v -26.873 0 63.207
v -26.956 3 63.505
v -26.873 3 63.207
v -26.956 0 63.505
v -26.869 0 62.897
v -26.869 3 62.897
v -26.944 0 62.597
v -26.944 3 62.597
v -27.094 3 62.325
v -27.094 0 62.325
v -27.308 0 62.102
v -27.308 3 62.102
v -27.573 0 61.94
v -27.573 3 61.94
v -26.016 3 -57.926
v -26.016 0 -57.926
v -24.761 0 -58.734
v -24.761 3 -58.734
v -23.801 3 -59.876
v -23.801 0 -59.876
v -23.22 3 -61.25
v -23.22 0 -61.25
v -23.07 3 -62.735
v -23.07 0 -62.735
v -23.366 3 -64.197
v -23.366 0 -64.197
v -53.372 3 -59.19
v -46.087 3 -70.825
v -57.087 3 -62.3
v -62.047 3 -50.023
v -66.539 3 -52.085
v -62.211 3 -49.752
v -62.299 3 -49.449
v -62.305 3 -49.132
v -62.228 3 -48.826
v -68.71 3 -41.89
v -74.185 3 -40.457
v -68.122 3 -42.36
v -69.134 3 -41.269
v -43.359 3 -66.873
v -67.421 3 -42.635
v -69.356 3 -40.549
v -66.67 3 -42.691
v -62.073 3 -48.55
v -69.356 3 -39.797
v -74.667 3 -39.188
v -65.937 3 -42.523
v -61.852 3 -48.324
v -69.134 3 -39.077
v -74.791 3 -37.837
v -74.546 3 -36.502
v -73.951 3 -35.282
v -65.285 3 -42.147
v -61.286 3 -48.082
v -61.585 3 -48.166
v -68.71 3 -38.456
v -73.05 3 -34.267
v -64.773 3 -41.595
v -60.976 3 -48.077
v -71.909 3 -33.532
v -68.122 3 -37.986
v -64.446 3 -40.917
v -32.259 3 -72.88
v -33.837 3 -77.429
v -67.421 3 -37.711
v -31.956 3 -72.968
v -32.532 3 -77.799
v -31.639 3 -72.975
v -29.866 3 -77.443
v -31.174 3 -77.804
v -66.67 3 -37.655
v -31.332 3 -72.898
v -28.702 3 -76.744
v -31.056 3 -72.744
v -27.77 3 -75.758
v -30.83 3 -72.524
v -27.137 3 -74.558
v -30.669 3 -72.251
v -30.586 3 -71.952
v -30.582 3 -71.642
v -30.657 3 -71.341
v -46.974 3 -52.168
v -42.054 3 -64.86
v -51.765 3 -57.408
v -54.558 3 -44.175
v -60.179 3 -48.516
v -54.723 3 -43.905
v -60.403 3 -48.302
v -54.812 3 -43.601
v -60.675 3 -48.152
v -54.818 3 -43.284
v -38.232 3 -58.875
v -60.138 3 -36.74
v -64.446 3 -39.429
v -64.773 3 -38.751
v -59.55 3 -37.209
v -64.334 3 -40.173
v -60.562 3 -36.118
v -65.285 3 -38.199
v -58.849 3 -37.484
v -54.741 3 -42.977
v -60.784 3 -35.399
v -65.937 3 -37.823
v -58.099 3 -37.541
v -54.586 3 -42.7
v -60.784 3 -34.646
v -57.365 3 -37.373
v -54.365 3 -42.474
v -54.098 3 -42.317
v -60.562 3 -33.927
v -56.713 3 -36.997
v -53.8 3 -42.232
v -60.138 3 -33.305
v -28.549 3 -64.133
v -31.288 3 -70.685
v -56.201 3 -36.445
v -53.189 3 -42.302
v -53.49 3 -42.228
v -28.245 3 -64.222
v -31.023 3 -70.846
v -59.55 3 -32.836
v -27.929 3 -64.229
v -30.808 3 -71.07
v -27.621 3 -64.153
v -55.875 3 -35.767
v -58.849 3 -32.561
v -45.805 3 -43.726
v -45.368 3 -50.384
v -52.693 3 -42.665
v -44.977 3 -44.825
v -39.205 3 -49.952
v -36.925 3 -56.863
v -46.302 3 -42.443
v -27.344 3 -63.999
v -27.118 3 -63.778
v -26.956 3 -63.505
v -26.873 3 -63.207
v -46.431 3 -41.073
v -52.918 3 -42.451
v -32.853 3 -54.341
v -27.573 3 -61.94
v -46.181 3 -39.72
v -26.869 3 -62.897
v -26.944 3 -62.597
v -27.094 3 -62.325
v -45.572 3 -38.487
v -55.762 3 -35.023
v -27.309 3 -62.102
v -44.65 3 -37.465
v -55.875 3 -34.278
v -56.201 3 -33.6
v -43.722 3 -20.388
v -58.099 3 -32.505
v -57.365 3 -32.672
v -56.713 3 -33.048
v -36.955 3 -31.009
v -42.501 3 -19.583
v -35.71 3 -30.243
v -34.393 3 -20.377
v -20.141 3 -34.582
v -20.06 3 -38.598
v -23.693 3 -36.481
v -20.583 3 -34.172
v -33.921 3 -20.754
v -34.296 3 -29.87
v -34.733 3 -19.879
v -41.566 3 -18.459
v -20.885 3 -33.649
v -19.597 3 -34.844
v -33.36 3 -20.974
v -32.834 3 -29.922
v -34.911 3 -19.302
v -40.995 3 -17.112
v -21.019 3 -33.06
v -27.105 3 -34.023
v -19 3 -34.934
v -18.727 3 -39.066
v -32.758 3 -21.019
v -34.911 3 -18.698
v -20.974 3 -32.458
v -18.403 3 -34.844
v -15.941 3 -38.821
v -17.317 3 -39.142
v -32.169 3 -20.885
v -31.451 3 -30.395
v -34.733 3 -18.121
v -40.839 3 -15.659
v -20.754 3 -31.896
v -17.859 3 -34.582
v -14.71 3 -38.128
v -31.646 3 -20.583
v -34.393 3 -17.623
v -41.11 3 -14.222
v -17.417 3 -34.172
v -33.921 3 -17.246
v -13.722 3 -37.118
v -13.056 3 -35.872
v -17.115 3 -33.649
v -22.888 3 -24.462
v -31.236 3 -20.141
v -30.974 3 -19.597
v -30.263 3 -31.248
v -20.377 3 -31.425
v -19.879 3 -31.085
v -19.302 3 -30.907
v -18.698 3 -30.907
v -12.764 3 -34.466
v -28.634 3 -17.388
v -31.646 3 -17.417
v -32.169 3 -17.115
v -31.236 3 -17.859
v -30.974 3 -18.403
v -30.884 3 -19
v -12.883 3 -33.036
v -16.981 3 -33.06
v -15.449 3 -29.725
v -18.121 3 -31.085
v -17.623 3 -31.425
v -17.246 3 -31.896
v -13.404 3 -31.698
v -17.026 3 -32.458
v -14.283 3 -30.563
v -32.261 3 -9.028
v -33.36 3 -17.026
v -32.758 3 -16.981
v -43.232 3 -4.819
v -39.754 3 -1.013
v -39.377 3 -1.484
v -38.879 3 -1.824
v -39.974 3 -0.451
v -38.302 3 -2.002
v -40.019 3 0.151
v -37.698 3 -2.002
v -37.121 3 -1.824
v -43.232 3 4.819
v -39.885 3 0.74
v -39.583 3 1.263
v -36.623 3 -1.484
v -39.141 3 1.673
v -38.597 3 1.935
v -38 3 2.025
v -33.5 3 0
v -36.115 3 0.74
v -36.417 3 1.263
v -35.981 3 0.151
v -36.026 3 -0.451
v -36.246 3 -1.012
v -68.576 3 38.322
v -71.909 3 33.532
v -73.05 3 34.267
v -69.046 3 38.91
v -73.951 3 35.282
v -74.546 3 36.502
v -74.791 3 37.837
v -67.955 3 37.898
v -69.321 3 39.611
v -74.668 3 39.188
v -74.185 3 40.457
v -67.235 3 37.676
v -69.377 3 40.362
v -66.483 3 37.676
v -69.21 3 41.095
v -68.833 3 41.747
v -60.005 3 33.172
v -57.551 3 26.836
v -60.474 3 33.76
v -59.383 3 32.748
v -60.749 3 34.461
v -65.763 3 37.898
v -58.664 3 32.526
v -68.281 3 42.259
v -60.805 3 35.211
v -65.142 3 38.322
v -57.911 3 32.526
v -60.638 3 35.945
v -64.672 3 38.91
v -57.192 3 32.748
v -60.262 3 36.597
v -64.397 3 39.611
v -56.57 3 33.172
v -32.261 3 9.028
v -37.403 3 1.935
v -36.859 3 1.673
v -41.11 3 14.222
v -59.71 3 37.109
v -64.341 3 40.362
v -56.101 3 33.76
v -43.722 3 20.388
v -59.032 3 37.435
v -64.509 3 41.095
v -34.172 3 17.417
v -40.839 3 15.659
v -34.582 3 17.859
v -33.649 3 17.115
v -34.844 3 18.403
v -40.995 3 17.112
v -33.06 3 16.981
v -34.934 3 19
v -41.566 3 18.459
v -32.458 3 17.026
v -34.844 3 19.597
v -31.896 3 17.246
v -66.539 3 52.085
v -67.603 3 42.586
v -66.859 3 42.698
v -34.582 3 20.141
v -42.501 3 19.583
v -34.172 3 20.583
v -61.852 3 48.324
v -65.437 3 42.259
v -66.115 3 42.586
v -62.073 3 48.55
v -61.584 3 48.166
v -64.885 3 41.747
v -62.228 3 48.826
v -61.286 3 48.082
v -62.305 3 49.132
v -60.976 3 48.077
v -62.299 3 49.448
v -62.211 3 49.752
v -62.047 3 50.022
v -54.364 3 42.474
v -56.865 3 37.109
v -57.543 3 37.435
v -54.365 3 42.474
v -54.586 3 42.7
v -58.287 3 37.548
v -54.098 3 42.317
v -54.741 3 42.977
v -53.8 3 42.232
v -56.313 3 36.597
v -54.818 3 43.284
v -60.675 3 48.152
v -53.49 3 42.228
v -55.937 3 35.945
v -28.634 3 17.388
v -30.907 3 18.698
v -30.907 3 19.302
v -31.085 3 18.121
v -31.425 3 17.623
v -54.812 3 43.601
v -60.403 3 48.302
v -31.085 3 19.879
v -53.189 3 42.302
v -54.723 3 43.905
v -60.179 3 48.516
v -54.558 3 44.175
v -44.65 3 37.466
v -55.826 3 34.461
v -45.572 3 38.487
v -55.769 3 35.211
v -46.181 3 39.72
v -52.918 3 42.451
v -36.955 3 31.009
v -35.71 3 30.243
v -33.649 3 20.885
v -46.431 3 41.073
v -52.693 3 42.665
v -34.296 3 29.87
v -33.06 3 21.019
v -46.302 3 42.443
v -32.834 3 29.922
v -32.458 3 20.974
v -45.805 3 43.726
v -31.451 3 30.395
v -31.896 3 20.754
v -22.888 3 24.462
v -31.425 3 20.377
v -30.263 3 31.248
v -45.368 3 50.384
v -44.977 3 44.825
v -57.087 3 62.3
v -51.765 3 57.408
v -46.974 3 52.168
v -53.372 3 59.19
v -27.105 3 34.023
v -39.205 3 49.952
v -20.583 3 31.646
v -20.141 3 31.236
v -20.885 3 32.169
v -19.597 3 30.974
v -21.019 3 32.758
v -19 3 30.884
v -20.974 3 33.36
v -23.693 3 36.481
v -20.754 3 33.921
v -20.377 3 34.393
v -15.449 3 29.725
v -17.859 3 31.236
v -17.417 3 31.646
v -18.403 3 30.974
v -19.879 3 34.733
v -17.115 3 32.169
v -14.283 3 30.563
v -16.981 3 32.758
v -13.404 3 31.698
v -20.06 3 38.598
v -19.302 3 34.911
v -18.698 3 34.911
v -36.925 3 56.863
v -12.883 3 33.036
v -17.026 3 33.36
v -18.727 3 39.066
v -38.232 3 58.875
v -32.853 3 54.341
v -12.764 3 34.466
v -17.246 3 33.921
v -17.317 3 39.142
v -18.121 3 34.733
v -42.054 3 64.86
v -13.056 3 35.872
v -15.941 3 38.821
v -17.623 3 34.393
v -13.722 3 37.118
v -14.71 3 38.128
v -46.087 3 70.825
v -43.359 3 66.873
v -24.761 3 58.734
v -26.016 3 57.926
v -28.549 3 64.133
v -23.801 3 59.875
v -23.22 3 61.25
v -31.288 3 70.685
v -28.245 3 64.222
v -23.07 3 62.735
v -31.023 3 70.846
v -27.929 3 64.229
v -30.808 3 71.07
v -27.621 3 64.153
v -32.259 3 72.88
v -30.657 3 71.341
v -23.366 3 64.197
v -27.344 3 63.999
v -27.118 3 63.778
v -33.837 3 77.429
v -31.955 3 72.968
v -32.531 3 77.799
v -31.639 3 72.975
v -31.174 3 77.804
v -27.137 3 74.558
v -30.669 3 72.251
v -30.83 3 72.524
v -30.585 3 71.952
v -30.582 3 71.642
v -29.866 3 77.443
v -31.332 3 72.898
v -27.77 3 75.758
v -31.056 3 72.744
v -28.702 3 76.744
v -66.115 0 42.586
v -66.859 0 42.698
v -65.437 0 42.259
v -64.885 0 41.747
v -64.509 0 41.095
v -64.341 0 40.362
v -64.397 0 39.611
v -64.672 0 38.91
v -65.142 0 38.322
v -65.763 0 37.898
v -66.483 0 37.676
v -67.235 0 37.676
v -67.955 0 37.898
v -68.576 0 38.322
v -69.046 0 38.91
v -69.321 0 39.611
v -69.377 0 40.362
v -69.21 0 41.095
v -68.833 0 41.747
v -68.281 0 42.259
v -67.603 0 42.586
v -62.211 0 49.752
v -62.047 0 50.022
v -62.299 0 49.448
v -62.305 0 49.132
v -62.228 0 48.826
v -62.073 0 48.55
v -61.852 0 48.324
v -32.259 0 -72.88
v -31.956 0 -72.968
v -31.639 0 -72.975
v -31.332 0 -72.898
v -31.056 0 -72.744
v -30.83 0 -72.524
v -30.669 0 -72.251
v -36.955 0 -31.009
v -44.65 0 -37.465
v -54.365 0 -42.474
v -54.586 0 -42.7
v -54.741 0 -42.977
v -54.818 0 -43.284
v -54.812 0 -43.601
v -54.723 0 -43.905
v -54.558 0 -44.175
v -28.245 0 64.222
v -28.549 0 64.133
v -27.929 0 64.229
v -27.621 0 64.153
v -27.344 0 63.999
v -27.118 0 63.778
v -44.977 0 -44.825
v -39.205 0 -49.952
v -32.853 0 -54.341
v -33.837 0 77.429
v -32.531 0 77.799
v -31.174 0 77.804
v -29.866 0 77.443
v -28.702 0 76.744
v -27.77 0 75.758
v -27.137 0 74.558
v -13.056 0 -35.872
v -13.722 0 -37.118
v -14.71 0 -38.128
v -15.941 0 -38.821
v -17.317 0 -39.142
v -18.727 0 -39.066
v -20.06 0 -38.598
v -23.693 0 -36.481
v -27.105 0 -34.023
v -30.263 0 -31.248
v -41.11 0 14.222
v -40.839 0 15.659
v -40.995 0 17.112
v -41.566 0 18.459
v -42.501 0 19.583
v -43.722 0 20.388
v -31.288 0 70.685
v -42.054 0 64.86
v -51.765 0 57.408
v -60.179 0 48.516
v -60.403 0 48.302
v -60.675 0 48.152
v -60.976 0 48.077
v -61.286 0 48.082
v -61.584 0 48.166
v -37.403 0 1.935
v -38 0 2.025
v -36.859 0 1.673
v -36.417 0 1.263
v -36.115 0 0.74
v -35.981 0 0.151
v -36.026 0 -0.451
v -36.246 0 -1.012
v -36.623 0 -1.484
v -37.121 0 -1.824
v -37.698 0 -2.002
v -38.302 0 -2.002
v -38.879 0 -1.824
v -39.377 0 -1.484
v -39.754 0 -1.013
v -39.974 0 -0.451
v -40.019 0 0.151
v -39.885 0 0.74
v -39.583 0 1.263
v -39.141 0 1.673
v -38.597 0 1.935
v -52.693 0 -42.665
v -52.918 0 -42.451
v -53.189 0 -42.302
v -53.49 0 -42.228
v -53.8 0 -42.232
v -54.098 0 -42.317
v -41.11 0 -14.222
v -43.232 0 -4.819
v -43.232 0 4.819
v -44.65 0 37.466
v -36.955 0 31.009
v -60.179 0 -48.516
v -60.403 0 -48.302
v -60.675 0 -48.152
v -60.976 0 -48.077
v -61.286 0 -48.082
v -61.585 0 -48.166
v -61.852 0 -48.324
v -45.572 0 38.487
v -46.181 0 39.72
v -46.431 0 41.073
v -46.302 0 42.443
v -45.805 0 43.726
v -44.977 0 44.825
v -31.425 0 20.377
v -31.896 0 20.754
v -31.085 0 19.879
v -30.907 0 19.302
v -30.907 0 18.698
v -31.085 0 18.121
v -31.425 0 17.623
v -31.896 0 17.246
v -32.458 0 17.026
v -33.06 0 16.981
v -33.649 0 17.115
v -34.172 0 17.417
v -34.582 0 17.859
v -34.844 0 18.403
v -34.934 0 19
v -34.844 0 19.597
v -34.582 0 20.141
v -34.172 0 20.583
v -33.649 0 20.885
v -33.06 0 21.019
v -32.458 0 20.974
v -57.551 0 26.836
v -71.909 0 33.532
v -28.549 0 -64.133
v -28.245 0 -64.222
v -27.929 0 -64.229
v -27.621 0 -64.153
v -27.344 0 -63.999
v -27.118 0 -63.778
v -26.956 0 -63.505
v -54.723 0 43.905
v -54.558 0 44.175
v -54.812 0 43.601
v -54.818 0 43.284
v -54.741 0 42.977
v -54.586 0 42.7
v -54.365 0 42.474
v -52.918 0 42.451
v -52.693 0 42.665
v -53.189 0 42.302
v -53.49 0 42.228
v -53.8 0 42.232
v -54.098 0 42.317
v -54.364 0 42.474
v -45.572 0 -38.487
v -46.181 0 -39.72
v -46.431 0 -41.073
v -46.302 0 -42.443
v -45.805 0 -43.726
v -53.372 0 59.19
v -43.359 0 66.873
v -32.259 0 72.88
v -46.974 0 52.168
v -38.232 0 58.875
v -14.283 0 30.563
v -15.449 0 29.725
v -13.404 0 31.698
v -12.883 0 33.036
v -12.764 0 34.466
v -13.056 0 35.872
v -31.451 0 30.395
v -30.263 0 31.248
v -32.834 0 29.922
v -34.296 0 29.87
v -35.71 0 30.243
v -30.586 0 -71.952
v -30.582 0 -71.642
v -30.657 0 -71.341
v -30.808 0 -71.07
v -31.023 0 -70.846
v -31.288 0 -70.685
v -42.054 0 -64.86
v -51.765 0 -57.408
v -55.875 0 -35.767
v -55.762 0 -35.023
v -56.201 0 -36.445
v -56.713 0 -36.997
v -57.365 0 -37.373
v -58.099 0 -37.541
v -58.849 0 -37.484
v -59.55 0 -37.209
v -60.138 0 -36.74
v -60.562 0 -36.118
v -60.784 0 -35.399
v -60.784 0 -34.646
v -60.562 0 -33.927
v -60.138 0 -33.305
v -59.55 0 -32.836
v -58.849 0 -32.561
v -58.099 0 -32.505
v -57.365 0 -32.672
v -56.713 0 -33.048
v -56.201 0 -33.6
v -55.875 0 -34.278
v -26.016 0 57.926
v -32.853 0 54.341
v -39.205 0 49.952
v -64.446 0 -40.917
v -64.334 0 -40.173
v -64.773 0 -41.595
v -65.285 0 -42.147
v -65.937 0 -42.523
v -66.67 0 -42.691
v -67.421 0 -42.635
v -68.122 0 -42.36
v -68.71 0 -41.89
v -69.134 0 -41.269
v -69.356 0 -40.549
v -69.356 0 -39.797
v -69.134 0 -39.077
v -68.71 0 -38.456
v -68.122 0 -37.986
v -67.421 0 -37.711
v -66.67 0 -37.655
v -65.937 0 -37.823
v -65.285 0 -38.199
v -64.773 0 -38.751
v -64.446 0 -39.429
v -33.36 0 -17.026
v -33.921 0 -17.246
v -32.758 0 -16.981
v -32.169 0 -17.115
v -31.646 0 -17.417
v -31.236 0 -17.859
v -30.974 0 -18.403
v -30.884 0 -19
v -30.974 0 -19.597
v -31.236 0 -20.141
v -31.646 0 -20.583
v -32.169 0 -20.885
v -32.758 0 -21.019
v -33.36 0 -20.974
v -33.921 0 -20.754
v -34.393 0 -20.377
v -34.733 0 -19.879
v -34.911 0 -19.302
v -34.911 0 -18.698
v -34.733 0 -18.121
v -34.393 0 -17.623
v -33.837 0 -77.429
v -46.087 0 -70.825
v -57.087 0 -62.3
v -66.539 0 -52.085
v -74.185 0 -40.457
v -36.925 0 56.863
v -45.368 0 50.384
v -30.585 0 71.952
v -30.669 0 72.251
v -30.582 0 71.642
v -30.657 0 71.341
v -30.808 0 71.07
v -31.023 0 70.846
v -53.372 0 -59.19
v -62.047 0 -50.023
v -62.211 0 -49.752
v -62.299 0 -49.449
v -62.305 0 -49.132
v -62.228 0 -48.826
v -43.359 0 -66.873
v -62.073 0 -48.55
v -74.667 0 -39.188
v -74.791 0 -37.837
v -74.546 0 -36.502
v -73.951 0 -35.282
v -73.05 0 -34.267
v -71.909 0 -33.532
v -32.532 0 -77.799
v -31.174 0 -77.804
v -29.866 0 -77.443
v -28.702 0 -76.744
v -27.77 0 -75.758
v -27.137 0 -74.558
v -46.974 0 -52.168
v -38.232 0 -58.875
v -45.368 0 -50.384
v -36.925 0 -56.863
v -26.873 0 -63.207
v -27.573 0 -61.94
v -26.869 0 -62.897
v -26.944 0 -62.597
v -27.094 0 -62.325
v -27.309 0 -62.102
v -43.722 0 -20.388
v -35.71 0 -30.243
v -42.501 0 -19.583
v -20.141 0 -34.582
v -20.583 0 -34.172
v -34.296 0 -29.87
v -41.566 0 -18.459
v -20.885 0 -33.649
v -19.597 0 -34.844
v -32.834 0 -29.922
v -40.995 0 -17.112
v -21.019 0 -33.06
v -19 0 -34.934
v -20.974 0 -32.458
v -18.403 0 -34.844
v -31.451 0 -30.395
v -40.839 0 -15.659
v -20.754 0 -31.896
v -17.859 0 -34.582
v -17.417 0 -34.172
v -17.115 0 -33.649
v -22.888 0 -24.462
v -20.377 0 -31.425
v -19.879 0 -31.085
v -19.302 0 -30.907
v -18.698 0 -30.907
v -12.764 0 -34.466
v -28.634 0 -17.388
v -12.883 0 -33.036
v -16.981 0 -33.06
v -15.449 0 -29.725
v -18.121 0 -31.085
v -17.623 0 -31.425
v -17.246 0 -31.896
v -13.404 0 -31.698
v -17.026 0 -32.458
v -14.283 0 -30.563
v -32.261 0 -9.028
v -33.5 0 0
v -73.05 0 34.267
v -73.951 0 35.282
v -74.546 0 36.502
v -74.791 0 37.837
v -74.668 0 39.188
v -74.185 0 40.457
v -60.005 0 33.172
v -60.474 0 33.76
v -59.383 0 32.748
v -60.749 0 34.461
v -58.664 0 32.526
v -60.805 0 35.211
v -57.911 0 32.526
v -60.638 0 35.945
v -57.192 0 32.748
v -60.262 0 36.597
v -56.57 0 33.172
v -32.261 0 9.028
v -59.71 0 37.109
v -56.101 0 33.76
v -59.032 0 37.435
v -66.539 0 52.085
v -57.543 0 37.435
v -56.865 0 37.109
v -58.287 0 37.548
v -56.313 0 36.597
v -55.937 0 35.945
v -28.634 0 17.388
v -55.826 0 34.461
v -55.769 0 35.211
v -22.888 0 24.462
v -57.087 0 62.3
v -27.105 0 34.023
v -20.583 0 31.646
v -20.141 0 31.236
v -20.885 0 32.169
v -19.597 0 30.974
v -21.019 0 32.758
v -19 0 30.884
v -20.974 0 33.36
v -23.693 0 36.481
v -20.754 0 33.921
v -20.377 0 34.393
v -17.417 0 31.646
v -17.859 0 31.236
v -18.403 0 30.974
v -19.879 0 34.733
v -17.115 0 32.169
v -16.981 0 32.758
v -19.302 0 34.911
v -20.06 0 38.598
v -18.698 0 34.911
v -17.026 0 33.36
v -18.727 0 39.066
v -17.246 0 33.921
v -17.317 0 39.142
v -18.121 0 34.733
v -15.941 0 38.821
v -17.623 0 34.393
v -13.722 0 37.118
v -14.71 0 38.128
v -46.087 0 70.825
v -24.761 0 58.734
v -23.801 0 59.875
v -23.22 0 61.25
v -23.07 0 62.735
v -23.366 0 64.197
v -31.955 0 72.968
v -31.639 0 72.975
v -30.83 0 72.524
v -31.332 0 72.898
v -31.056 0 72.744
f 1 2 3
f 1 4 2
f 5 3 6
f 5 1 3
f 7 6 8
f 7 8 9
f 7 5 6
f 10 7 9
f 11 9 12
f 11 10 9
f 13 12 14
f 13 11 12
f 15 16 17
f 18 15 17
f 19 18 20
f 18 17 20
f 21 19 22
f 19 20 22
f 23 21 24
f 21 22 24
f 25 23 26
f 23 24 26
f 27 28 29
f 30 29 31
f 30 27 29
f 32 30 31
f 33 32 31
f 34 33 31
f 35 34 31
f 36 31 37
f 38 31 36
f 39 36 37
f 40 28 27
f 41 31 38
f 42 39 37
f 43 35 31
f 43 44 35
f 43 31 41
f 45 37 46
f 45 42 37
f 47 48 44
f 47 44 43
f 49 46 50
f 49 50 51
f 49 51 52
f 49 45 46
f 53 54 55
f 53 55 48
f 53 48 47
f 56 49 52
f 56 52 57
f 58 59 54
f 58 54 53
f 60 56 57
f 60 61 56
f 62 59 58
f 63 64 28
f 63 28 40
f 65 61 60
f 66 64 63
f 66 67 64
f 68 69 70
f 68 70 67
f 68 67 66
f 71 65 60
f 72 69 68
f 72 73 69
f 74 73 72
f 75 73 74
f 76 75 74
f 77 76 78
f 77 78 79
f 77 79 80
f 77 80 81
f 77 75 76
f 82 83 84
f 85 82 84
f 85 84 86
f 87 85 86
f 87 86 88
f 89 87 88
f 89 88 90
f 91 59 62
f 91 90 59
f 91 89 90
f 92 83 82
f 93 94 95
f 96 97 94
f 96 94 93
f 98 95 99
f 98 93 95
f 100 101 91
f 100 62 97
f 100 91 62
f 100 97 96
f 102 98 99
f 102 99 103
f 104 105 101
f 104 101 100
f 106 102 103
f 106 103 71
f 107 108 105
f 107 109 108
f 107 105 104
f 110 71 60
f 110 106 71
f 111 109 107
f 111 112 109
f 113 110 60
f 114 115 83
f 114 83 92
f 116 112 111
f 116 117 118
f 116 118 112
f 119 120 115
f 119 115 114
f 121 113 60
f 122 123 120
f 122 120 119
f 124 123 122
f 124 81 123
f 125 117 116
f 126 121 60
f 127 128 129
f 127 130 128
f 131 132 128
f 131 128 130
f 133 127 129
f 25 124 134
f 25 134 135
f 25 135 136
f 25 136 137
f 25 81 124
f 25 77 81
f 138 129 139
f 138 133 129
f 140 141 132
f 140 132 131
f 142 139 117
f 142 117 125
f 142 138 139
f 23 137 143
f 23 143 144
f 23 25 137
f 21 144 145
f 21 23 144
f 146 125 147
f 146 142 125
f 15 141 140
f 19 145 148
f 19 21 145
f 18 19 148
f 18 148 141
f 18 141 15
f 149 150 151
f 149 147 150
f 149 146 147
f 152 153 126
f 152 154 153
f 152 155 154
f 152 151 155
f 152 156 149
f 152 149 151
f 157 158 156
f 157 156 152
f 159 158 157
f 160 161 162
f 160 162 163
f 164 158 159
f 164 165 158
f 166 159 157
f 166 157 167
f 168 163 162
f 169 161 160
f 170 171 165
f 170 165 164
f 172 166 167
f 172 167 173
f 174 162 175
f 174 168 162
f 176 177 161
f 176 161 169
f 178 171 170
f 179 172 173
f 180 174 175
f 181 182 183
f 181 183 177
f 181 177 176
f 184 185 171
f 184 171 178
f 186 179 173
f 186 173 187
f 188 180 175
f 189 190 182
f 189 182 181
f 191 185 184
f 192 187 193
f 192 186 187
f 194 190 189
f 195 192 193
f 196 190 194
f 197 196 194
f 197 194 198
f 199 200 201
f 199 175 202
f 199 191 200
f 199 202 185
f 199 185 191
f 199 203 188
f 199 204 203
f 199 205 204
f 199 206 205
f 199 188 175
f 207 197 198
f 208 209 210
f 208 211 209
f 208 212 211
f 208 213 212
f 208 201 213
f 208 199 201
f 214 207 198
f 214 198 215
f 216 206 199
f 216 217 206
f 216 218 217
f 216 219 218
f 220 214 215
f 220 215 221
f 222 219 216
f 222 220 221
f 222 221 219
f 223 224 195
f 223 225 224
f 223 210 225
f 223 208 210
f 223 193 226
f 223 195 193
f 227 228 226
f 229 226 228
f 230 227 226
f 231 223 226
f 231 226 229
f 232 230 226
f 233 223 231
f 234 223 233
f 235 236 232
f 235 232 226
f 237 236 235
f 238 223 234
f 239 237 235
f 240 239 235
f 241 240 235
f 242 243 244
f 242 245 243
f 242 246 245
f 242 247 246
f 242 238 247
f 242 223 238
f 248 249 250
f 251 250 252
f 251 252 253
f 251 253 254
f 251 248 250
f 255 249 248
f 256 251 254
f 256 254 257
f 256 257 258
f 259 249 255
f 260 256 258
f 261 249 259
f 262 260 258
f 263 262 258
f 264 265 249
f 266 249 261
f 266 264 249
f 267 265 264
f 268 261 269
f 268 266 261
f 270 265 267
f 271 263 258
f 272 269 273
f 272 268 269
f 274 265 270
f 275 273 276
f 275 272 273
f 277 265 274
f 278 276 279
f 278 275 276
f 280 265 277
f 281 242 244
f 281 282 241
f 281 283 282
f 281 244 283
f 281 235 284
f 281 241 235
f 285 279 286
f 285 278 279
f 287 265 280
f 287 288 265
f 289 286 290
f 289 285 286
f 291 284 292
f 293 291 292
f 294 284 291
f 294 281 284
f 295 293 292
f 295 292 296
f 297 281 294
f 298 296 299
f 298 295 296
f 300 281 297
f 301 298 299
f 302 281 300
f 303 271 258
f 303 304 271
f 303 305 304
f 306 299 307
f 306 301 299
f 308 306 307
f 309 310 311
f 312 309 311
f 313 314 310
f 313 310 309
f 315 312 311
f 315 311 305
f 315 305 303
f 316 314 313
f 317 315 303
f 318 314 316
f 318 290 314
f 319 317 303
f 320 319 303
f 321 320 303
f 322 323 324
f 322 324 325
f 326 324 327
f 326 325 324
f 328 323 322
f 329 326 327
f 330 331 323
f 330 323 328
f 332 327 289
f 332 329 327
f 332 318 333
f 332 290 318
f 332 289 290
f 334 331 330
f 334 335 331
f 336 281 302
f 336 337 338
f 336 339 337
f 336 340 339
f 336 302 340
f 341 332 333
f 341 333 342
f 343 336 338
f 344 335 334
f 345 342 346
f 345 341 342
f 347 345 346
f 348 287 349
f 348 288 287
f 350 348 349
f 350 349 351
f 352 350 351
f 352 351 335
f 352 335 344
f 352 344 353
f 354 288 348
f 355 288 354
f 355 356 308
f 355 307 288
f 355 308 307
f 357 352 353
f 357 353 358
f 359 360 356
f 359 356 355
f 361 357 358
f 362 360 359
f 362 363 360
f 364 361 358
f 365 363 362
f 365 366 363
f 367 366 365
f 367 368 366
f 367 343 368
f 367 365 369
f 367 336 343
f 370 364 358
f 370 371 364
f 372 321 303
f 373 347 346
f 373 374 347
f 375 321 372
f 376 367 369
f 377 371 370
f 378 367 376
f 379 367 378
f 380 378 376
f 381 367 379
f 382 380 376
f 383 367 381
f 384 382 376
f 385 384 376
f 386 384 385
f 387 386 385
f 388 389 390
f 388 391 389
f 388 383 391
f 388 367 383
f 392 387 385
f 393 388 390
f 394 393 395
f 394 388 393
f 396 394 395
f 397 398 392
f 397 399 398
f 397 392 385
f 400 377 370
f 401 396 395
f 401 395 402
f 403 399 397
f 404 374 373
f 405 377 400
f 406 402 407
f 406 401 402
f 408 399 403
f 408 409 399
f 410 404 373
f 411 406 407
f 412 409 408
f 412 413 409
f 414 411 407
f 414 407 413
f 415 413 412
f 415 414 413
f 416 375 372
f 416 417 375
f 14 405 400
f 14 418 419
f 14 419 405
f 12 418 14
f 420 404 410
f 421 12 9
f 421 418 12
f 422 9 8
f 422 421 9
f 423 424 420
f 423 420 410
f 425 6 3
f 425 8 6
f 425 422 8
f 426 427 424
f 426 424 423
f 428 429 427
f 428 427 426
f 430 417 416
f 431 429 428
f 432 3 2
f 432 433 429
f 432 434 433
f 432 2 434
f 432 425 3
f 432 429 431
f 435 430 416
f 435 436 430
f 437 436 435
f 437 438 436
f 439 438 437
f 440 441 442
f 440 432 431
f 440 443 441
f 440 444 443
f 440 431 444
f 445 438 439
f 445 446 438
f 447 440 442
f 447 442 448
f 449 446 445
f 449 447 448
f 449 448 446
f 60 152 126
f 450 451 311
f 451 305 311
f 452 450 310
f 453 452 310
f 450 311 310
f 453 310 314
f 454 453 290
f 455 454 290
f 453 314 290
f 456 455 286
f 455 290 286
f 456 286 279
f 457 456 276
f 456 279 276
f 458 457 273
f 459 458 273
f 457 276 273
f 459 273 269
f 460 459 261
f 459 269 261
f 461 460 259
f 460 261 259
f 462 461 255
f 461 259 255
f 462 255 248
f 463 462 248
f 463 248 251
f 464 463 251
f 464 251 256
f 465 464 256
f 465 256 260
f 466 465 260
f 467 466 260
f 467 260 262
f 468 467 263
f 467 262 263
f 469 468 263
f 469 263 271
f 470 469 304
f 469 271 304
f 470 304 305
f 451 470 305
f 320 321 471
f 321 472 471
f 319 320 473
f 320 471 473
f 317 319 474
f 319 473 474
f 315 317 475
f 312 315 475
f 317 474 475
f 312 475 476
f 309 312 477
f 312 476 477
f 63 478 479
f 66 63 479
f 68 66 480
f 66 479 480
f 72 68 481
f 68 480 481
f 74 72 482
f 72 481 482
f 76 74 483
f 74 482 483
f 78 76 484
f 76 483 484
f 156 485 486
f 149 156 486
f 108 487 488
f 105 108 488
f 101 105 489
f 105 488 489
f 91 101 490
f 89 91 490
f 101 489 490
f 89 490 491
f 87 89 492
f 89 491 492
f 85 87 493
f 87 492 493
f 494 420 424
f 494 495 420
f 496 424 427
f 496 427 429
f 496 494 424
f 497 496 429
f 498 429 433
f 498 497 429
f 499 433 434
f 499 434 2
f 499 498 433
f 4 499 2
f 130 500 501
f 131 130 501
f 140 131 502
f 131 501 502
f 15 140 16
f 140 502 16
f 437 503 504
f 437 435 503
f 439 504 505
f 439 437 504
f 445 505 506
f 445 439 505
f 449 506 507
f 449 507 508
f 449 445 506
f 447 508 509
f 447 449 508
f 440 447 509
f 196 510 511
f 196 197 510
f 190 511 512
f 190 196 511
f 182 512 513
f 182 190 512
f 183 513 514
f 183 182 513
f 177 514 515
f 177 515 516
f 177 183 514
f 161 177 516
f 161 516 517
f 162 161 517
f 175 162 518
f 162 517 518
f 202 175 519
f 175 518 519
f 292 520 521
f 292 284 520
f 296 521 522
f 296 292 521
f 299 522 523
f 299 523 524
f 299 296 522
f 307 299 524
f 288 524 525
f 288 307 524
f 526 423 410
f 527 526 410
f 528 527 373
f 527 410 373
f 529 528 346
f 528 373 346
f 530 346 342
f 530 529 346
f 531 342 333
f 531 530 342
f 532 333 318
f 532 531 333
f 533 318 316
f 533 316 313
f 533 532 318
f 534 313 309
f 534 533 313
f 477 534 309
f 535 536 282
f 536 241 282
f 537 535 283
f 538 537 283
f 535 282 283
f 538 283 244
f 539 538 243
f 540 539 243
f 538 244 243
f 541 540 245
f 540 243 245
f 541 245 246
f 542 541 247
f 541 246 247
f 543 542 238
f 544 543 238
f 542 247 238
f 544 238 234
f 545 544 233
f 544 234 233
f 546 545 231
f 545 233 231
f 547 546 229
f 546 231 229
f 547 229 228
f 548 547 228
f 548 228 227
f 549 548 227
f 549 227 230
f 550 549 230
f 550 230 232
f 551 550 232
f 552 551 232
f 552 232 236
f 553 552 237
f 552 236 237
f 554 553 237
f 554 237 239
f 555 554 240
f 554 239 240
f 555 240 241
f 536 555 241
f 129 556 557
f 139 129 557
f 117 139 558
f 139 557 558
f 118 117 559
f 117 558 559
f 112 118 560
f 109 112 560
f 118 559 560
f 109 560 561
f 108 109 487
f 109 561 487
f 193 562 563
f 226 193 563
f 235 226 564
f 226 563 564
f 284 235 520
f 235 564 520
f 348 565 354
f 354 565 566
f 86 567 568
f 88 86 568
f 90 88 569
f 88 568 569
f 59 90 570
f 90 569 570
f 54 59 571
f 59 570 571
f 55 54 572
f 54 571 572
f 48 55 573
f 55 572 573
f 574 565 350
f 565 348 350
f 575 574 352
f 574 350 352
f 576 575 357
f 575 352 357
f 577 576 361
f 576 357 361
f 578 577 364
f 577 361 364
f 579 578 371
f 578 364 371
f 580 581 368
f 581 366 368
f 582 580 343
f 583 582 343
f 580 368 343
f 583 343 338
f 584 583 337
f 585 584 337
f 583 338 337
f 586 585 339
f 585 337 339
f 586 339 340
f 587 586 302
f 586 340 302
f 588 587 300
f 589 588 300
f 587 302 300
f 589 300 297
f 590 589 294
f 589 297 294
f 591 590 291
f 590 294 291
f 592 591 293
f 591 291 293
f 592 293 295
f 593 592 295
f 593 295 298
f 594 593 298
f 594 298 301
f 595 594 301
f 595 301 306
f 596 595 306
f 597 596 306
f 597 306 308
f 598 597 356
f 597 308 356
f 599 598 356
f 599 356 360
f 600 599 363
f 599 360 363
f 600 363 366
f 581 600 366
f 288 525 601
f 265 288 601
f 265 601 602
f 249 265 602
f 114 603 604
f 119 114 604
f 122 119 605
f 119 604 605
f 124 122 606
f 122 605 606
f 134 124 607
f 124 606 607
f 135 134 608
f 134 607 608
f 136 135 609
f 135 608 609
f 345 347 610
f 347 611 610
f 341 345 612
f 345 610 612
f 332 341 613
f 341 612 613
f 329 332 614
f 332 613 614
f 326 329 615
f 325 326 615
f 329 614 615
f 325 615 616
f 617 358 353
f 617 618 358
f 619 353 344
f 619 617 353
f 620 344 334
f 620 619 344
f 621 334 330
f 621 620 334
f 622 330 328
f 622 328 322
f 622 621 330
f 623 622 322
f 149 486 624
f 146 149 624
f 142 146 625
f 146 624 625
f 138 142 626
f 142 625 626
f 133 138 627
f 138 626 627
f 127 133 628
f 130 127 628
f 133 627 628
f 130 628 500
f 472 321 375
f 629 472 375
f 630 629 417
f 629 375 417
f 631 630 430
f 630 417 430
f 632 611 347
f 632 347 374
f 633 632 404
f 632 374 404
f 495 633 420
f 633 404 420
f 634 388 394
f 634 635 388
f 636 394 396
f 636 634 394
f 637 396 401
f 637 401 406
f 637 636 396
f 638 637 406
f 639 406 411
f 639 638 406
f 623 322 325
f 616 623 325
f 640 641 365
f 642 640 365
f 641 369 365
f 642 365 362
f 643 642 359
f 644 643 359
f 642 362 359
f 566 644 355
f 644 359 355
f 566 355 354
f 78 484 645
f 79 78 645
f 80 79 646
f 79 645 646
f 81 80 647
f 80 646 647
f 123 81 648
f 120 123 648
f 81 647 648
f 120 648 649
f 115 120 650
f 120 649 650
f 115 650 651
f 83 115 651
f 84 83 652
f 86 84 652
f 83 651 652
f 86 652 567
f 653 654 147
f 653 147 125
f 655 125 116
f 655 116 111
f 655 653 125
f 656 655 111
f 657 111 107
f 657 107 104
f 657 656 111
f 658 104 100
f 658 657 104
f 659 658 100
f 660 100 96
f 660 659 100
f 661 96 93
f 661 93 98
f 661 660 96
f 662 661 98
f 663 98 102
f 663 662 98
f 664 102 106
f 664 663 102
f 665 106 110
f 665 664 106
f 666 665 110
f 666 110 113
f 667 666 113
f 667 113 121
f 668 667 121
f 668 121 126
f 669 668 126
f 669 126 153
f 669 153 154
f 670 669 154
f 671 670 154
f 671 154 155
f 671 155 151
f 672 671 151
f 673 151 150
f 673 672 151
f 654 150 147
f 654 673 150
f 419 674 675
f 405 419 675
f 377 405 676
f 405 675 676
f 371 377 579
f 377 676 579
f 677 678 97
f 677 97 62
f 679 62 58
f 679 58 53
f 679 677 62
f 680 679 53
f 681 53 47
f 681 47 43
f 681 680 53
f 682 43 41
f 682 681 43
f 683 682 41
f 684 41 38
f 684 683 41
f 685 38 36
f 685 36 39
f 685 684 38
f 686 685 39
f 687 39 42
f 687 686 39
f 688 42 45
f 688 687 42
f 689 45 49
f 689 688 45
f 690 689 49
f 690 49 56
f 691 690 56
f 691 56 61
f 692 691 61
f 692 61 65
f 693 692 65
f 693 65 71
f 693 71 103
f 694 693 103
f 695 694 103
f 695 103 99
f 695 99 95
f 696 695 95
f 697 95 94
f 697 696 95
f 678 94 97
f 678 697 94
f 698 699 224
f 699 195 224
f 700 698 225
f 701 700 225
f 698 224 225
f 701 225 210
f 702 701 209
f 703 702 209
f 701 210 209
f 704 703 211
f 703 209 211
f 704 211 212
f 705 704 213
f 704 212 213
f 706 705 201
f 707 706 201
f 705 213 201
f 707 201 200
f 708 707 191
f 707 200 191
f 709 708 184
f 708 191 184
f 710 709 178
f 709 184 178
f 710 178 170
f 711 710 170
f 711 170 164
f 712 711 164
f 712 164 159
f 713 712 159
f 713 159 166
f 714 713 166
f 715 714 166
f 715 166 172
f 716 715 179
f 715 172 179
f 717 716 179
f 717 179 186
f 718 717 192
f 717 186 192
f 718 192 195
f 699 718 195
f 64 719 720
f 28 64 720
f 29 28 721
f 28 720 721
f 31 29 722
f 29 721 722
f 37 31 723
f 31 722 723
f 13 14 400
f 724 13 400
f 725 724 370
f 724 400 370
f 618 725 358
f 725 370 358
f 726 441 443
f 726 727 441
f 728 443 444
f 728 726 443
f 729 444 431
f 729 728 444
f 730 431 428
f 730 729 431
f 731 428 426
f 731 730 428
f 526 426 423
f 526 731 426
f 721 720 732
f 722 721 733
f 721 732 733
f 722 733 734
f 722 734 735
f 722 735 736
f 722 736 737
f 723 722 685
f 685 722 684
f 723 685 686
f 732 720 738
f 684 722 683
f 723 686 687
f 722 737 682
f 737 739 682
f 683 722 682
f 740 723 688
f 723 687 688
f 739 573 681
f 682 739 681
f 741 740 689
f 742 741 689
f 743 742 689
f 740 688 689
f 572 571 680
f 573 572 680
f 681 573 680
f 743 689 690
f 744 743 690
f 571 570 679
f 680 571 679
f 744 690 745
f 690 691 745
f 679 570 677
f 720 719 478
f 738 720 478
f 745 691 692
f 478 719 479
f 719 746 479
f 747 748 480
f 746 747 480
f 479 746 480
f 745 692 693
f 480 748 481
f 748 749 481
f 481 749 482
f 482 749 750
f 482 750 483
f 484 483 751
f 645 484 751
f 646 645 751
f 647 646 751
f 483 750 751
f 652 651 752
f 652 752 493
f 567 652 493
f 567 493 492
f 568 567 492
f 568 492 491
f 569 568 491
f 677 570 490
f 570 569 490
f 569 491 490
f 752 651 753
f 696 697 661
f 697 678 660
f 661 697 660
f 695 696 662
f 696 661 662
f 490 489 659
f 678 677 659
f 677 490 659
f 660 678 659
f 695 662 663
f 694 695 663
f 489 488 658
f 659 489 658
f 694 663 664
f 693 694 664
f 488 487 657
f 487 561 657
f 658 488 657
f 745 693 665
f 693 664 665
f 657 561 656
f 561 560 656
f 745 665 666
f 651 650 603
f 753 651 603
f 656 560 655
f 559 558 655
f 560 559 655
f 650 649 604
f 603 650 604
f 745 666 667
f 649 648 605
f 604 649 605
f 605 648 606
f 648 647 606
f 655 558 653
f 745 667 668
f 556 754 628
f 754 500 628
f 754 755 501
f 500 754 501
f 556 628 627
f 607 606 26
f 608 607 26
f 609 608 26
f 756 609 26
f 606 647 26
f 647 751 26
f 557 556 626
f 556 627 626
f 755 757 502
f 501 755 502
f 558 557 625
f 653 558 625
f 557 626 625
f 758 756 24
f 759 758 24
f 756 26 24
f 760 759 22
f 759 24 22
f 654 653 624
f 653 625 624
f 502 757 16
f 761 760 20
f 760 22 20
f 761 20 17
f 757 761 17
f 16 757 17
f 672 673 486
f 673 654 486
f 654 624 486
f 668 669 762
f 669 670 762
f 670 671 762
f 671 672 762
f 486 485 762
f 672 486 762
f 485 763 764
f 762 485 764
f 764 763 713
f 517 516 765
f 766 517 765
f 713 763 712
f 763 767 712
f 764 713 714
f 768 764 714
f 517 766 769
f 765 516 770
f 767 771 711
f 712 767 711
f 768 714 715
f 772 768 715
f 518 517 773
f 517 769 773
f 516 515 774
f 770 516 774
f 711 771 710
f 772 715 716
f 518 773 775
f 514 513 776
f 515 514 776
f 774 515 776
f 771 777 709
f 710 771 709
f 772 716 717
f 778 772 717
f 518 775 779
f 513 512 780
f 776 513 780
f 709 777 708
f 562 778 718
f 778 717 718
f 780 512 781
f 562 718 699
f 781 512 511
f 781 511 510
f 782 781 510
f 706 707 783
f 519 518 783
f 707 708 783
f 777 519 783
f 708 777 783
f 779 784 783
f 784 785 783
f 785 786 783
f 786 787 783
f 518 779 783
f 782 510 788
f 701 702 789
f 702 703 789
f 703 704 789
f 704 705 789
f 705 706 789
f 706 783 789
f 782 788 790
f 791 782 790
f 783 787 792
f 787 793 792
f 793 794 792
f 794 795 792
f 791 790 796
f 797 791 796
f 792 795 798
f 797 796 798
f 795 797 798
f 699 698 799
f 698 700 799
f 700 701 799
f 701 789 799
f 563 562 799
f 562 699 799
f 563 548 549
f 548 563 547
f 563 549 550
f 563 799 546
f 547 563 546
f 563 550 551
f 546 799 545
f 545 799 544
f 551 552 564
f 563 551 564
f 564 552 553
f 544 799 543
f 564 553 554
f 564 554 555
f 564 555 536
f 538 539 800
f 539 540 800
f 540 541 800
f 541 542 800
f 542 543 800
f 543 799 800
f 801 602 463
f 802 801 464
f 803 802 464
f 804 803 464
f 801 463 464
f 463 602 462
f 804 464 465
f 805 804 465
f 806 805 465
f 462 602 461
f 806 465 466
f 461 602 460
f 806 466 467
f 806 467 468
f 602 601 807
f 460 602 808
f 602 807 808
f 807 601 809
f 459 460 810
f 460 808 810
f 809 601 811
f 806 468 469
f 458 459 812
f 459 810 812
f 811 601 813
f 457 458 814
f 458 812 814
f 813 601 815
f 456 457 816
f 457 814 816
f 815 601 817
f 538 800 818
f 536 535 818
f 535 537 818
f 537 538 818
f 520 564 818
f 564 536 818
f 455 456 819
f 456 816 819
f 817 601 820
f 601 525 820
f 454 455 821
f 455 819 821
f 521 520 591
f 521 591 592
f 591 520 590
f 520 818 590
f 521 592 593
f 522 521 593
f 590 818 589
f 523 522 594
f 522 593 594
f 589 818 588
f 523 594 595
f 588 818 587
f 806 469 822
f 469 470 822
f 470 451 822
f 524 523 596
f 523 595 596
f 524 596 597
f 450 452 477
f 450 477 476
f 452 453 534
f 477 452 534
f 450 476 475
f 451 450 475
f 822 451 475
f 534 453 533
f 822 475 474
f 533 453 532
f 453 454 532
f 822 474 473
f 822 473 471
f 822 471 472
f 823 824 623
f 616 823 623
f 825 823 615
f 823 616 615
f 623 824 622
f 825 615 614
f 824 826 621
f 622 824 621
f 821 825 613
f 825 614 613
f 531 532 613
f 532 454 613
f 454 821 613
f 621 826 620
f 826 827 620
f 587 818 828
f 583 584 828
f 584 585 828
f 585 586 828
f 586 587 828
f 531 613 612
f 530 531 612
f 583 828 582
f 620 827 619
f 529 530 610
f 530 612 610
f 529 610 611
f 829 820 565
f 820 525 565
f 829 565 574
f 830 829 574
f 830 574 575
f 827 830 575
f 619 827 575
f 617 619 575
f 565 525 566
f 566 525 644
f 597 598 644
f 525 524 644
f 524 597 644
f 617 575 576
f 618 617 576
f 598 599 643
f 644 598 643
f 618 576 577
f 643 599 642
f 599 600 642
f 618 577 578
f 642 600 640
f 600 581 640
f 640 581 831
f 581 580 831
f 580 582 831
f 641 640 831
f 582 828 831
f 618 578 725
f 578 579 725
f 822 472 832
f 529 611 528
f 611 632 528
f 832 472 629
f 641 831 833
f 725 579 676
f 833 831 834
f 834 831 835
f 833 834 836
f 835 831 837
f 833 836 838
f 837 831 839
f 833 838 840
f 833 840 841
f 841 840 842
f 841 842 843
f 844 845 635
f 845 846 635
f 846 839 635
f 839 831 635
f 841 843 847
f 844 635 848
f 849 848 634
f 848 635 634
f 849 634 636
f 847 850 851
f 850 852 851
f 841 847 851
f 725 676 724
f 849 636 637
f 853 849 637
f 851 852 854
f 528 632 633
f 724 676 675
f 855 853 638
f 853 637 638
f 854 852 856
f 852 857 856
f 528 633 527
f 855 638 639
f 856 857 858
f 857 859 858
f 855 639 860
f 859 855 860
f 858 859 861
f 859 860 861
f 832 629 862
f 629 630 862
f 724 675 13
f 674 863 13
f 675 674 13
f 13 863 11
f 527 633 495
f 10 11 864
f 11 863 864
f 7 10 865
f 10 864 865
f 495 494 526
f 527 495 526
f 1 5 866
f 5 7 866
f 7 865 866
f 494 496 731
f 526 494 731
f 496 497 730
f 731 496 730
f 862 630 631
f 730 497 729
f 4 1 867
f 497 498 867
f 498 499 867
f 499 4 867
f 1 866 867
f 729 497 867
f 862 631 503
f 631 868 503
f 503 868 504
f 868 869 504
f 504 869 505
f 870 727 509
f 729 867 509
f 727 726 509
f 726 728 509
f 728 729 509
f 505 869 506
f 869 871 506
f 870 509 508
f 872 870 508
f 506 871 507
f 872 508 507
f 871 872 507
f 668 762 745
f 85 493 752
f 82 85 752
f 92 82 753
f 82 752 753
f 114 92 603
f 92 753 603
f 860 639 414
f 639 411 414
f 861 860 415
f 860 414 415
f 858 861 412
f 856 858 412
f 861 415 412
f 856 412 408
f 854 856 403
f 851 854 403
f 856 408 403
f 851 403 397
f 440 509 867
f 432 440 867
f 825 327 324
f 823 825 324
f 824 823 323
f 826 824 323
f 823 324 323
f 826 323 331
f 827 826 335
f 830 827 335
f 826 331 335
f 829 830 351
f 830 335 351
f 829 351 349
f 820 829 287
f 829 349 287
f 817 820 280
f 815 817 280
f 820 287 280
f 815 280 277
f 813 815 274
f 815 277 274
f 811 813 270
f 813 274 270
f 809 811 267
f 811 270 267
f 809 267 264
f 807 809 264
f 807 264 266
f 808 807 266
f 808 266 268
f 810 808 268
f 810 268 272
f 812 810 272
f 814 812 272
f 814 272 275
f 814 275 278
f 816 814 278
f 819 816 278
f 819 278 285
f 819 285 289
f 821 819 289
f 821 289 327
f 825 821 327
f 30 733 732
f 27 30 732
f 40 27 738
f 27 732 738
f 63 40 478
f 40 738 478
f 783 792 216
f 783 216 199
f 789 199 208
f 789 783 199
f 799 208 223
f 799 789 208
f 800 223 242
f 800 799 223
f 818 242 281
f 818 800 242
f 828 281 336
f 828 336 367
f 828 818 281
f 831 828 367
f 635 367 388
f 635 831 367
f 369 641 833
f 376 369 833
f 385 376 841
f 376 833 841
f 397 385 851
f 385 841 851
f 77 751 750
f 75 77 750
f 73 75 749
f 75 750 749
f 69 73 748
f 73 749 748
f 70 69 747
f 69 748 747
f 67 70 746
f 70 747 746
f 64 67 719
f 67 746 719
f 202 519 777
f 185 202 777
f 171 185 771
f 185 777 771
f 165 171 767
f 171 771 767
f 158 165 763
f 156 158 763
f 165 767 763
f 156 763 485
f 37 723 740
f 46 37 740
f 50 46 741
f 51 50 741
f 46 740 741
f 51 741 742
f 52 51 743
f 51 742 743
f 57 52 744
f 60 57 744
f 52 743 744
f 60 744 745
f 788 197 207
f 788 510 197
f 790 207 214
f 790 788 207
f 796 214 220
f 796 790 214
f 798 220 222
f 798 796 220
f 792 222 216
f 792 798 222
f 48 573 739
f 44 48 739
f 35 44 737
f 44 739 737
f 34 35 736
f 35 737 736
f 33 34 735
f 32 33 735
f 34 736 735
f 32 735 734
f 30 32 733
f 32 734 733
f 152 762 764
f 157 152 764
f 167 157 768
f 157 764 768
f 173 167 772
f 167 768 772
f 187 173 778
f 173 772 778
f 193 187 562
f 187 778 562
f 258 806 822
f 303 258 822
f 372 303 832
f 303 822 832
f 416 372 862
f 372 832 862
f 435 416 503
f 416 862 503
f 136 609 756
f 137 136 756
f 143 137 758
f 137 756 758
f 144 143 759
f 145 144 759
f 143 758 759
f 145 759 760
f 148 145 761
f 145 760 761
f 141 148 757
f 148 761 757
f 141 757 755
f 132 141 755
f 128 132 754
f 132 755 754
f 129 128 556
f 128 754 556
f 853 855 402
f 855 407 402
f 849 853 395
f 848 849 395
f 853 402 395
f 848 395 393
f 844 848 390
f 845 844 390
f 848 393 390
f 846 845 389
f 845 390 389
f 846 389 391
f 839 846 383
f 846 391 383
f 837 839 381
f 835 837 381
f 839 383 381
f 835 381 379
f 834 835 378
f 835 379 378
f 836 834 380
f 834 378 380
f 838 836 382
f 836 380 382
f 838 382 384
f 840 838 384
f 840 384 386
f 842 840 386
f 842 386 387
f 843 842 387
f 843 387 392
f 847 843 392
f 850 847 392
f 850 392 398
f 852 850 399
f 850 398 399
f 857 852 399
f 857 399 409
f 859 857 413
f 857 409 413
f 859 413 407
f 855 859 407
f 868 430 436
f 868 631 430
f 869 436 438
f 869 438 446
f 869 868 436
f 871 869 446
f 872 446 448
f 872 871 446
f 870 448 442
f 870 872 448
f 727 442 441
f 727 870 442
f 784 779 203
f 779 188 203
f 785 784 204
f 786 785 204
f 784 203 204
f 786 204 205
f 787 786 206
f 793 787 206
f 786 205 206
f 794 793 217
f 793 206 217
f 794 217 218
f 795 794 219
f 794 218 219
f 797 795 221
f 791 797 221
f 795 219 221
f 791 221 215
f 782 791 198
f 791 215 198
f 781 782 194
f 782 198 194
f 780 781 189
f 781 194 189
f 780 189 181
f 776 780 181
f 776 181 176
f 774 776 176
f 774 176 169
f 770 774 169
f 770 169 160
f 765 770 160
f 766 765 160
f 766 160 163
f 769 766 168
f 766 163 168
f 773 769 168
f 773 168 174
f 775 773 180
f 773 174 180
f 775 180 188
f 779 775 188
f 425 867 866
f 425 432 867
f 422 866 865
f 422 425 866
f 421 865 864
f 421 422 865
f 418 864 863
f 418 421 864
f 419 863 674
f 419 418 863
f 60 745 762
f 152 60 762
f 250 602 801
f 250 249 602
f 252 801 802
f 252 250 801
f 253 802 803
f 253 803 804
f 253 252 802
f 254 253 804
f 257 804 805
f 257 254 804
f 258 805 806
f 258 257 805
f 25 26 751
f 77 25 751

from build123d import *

# Parameters (mm, degrees)
SKETCH1_R               = 43.5
SKETCH1_R_2             = 33.5
BOSS_EXTRUDE1_DEPTH     = 3
SKETCH3_R               = 2.025
CUT_EXTRUDE2_DEPTH      = 62.591395503
CIRPATTERN1_COUNT       = 12
CUT_EXTRUDE1_DEPTH      = 62.591395503
BOSS_EXTRUDE2_DEPTH     = 3
CUT_EXTRUDE_THIN1_DEPTH = 3
FILLET1_R               = 1.2
FILLET2_R               = 5
SKETCH6_R               = 2.525
CUT_EXTRUDE3_DEPTH      = 108.998410492
MIRROR4_OUTLINE_R       = 2.525
MIRROR4_DEPTH           = 3


# Read off the part's stored shape, not the designer's step: Mirror4
with BuildPart() as part:
    # Sketch1 → Boss-Extrude1 (new body)
    with BuildSketch(Plane(origin=(0, 0, 0), x_dir=(1, 0, 0), z_dir=(0, 1, 0))):
        with Locations(Location((0, 0, 0), (0, 0, 270))):
            Circle(SKETCH1_R)
        with Locations(Location((0, 0, 0), (0, 0, 270))):
            Circle(SKETCH1_R_2, mode=Mode.SUBTRACT)
    extrude(amount=BOSS_EXTRUDE1_DEPTH)

    # Sketch3 → Cut-Extrude2 (cut, symmetric)
    with BuildSketch(Plane(origin=(0, 3, 0), x_dir=(1, 0, 0), z_dir=(0, 1, 0))):
        with Locations(Location((-38, 0, 0), (0, 0, 270))):
            Circle(SKETCH3_R)
    cut_extrude2 = extrude(amount=CUT_EXTRUDE2_DEPTH, both=True, mode=Mode.SUBTRACT)

    # CirPattern1: Cut-Extrude2 ×12 about axis
    cirpattern1_axis = Axis((0, 0, 0), (0, 1, 0))
    for i in range(1, CIRPATTERN1_COUNT):
        add(cut_extrude2.rotate(cirpattern1_axis, i * 360 / CIRPATTERN1_COUNT), mode=Mode.SUBTRACT)

    # Sketch2 → Cut-Extrude1 (cut, symmetric)
    with BuildSketch(Plane(origin=(0, 3, 0), x_dir=(1, 0, 0), z_dir=(0, 1, 0))):
        with BuildLine():
            Line((0, 0), (43.5, 0))
            ThreePointArc((43.5, 0), (24.950574981, -35.633113927), (-14.877876235, -40.876629004))
            Line((-14.877876235, -40.876629004), (0, 0))
        make_face()
    cut_extrude1 = extrude(amount=CUT_EXTRUDE1_DEPTH, both=True, mode=Mode.SUBTRACT)

    # Mirror1: Cut-Extrude1 across plane
    add(cut_extrude1.mirror(Plane.XY), mode=Mode.SUBTRACT)

    # Sketch4 → Boss-Extrude2 (add)
    with BuildSketch(Plane(origin=(0, 0, 0), x_dir=(1, 0, 0), z_dir=(0, 1, 0))):
        with BuildLine():
            ThreePointArc((-33.322933276, -27.961261021), (-36.687527893, -23.372532963), (-39.424388736, -18.383894386))
            Line((-39.424388736, -18.383894386), (-57.550544477, -26.836259621))
            Line((-57.550544477, -26.836259621), (-76.583008005, -35.711243117))
            ThreePointArc((-76.583008005, -35.711243117), (-57.087372544, -62.29993496), (-28.900702111, -79.404026456))
            Line((-28.900702111, -79.404026456), (-21.718279101, -59.67048142))
            ThreePointArc((-21.718279101, -59.67048142), (-36.422103708, -52.016154812), (-48.643822138, -40.817013215))
            Line((-48.643822138, -40.817013215), (-33.322933276, -27.961261021))
        make_face()
    extrude(amount=BOSS_EXTRUDE2_DEPTH)

    # Sketch5 → Cut-Extrude-Thin1 (cut)
    with BuildSketch(Plane(origin=(0, 3, 0), x_dir=(1, 0, 0), z_dir=(0, 1, 0))):
        with BuildLine():
            ThreePointArc((-55.318354903, -43.219435568), (-42.735052316, -55.693404488), (-27.42932522, -64.619440712))
            Line((-27.42932522, -64.619440712), (-26.491570512, -62.410229064))
            ThreePointArc((-26.491570512, -62.410229064), (-41.274024887, -53.789356472), (-53.427129095, -41.741848027))
            Line((-53.427129095, -41.741848027), (-55.318354903, -43.219435568))
        make_face()
        with BuildLine():
            ThreePointArc((-62.804457062, -49.068219583), (-48.518285892, -63.230261221), (-31.141270941, -73.36423682))
            Line((-31.141270941, -73.36423682), (-30.203516232, -71.155025172))
            ThreePointArc((-30.203516232, -71.155025172), (-47.057258462, -61.326213205), (-60.913231254, -47.590632043))
            Line((-60.913231254, -47.590632043), (-62.804457062, -49.068219583))
        make_face()
    extrude(amount=-CUT_EXTRUDE_THIN1_DEPTH, mode=Mode.SUBTRACT)

    # Fillet1
    fillet1_edges = [part.edges().sort_by_distance(p)[0] for p in [
        (-55.318354903, 1.5, 43.219435568),
        (-62.804457062, 1.5, 49.068219583),
        (-53.427129095, 1.5, 41.741848027),
        (-60.913231254, 1.5, 47.590632043),
        (-26.491570512, 1.5, 62.410229064),
        (-30.203516232, 1.5, 71.155025172),
        (-27.42932522, 1.5, 64.619440712),
        (-31.141270941, 1.5, 73.36423682),
    ]]
    fillet(fillet1_edges, radius=FILLET1_R - 0.0001)  # a hair under: the kernel refuses the full size

    # Fillet2
    fillet2_edges = [part.edges().sort_by_distance(p)[0] for p in [
        (-14.877876235, 1.5, -40.876629004),
        (-11.457674801, 1.5, -31.479702796),
        (-11.457674801, 1.5, 31.479702796),
        (-14.877876235, 1.5, 40.876629004),
        (-39.424388736, 1.5, 18.383894386),
        (-76.583008005, 1.5, 35.711243117),
        (-28.900702111, 1.5, 79.404026456),
        (-21.718279101, 1.5, 59.67048142),
        (-33.322933276, 1.5, 27.961261021),
        (-48.643822138, 1.5, 40.817013215),
    ]]
    fillet(fillet2_edges, radius=FILLET2_R - 0.0001)  # a hair under: the kernel refuses the full size

    # Sketch6 → Cut-Extrude3 (cut, symmetric)
    with BuildSketch(Plane(origin=(0, 3, 0), x_dir=(1, 0, 0), z_dir=(0, 1, 0))):
        with Locations(Location((-58.287376448, -35.022589094, 0), (0, 0, 270))):
            Circle(SKETCH6_R)
        with Locations(Location((-66.859049455, -40.172969843, 0), (0, 0, 270))):
            Circle(SKETCH6_R)
    extrude(amount=CUT_EXTRUDE3_DEPTH, both=True, mode=Mode.SUBTRACT)

    # Mirror4 outline → Mirror4 (add)
    with BuildSketch(Plane(origin=(0, 0, 0), x_dir=(1, 0, 0), z_dir=(0, 1, 0))):
        with BuildLine():
            ThreePointArc((-33.837450466, 77.42917374), (-57.087372544, 62.29993496), (-74.185404229, 40.457085898))
            ThreePointArc((-74.185404229, 40.457085898), (-74.545675834, 36.50174496), (-71.908826648, 33.531636555))
            Line((-71.908826648, 33.531636555), (-43.721719229, 20.387772504))
            ThreePointArc((-43.721719229, 20.387772504), (-41.230877439, 17.806566879), (-41.109572338, 14.221570314))
            ThreePointArc((-41.109572338, 14.221570314), (-36.687527893, 23.372532963), (-30.262775922, 31.247630206))
            ThreePointArc((-30.262775922, 31.247630206), (-33.563151977, 29.842484947), (-36.955193962, 31.009089623))
            Line((-36.955193962, 31.009089623), (-44.649615181, 37.46547563))
            ThreePointArc((-44.649615181, 37.46547563), (-46.430731946, 41.073375084), (-44.977187998, 44.82524467))
            ThreePointArc((-44.977187998, 44.82524467), (-36.095854194, 52.243079063), (-26.015854641, 57.926033071))
            ThreePointArc((-26.015854641, 57.926033071), (-23.458659602, 60.540951414), (-23.365884028, 64.197238753))
            Line((-23.365884028, 64.197238753), (-27.136771358, 74.557666543))
            ThreePointArc((-27.136771358, 74.557666543), (-29.865761055, 77.443343725), (-33.837450466, 77.42917374))
        make_face()
        with Locations((-66.859049455, 40.172969843)):
            Circle(MIRROR4_OUTLINE_R, mode=Mode.SUBTRACT)
        with Locations((-58.287376448, 35.022589094)):
            Circle(MIRROR4_OUTLINE_R, mode=Mode.SUBTRACT)
        with BuildLine():
            ThreePointArc((-54.558346188, 44.174957399), (-42.735052316, 55.693404488), (-28.548993164, 64.132635914))
            ThreePointArc((-28.548993164, 64.132635914), (-27.6211406, 64.152839182), (-26.956370363, 63.505228894))
            ThreePointArc((-26.956370363, 63.505228894), (-26.944488545, 62.596515953), (-27.57295921, 61.940067165))
            ThreePointArc((-27.57295921, 61.940067165), (-41.274024887, 53.789356472), (-52.693103583, 42.664702445))
            ThreePointArc((-52.693103583, 42.664702445), (-53.489844598, 42.227547847), (-54.364518656, 42.474217018))
            ThreePointArc((-54.364518656, 42.474217018), (-54.818006961, 43.283949635), (-54.558346188, 44.174957399))
        make_face(mode=Mode.SUBTRACT)
        with BuildLine():
            ThreePointArc((-62.0470311, 50.02255423), (-48.518285891, 63.230261221), (-32.259123686, 72.879619504))
            ThreePointArc((-32.259123686, 72.879619504), (-31.332405, 72.898334407), (-30.668809601, 72.251187656))
            ThreePointArc((-30.668809601, 72.251187656), (-30.657391319, 71.341299876), (-31.287707164, 70.685001099))
            ThreePointArc((-31.287707164, 70.685001099), (-47.057258463, 61.326213205), (-60.178613602, 48.516228883))
            ThreePointArc((-60.178613602, 48.516228883), (-60.975687285, 48.077253152), (-61.851616121, 48.323778652))
            ThreePointArc((-61.851616121, 48.323778652), (-62.304960755, 49.13225649), (-62.0470311, 50.02255423))
        make_face(mode=Mode.SUBTRACT)
    extrude(amount=MIRROR4_DEPTH)


solid = part.part
